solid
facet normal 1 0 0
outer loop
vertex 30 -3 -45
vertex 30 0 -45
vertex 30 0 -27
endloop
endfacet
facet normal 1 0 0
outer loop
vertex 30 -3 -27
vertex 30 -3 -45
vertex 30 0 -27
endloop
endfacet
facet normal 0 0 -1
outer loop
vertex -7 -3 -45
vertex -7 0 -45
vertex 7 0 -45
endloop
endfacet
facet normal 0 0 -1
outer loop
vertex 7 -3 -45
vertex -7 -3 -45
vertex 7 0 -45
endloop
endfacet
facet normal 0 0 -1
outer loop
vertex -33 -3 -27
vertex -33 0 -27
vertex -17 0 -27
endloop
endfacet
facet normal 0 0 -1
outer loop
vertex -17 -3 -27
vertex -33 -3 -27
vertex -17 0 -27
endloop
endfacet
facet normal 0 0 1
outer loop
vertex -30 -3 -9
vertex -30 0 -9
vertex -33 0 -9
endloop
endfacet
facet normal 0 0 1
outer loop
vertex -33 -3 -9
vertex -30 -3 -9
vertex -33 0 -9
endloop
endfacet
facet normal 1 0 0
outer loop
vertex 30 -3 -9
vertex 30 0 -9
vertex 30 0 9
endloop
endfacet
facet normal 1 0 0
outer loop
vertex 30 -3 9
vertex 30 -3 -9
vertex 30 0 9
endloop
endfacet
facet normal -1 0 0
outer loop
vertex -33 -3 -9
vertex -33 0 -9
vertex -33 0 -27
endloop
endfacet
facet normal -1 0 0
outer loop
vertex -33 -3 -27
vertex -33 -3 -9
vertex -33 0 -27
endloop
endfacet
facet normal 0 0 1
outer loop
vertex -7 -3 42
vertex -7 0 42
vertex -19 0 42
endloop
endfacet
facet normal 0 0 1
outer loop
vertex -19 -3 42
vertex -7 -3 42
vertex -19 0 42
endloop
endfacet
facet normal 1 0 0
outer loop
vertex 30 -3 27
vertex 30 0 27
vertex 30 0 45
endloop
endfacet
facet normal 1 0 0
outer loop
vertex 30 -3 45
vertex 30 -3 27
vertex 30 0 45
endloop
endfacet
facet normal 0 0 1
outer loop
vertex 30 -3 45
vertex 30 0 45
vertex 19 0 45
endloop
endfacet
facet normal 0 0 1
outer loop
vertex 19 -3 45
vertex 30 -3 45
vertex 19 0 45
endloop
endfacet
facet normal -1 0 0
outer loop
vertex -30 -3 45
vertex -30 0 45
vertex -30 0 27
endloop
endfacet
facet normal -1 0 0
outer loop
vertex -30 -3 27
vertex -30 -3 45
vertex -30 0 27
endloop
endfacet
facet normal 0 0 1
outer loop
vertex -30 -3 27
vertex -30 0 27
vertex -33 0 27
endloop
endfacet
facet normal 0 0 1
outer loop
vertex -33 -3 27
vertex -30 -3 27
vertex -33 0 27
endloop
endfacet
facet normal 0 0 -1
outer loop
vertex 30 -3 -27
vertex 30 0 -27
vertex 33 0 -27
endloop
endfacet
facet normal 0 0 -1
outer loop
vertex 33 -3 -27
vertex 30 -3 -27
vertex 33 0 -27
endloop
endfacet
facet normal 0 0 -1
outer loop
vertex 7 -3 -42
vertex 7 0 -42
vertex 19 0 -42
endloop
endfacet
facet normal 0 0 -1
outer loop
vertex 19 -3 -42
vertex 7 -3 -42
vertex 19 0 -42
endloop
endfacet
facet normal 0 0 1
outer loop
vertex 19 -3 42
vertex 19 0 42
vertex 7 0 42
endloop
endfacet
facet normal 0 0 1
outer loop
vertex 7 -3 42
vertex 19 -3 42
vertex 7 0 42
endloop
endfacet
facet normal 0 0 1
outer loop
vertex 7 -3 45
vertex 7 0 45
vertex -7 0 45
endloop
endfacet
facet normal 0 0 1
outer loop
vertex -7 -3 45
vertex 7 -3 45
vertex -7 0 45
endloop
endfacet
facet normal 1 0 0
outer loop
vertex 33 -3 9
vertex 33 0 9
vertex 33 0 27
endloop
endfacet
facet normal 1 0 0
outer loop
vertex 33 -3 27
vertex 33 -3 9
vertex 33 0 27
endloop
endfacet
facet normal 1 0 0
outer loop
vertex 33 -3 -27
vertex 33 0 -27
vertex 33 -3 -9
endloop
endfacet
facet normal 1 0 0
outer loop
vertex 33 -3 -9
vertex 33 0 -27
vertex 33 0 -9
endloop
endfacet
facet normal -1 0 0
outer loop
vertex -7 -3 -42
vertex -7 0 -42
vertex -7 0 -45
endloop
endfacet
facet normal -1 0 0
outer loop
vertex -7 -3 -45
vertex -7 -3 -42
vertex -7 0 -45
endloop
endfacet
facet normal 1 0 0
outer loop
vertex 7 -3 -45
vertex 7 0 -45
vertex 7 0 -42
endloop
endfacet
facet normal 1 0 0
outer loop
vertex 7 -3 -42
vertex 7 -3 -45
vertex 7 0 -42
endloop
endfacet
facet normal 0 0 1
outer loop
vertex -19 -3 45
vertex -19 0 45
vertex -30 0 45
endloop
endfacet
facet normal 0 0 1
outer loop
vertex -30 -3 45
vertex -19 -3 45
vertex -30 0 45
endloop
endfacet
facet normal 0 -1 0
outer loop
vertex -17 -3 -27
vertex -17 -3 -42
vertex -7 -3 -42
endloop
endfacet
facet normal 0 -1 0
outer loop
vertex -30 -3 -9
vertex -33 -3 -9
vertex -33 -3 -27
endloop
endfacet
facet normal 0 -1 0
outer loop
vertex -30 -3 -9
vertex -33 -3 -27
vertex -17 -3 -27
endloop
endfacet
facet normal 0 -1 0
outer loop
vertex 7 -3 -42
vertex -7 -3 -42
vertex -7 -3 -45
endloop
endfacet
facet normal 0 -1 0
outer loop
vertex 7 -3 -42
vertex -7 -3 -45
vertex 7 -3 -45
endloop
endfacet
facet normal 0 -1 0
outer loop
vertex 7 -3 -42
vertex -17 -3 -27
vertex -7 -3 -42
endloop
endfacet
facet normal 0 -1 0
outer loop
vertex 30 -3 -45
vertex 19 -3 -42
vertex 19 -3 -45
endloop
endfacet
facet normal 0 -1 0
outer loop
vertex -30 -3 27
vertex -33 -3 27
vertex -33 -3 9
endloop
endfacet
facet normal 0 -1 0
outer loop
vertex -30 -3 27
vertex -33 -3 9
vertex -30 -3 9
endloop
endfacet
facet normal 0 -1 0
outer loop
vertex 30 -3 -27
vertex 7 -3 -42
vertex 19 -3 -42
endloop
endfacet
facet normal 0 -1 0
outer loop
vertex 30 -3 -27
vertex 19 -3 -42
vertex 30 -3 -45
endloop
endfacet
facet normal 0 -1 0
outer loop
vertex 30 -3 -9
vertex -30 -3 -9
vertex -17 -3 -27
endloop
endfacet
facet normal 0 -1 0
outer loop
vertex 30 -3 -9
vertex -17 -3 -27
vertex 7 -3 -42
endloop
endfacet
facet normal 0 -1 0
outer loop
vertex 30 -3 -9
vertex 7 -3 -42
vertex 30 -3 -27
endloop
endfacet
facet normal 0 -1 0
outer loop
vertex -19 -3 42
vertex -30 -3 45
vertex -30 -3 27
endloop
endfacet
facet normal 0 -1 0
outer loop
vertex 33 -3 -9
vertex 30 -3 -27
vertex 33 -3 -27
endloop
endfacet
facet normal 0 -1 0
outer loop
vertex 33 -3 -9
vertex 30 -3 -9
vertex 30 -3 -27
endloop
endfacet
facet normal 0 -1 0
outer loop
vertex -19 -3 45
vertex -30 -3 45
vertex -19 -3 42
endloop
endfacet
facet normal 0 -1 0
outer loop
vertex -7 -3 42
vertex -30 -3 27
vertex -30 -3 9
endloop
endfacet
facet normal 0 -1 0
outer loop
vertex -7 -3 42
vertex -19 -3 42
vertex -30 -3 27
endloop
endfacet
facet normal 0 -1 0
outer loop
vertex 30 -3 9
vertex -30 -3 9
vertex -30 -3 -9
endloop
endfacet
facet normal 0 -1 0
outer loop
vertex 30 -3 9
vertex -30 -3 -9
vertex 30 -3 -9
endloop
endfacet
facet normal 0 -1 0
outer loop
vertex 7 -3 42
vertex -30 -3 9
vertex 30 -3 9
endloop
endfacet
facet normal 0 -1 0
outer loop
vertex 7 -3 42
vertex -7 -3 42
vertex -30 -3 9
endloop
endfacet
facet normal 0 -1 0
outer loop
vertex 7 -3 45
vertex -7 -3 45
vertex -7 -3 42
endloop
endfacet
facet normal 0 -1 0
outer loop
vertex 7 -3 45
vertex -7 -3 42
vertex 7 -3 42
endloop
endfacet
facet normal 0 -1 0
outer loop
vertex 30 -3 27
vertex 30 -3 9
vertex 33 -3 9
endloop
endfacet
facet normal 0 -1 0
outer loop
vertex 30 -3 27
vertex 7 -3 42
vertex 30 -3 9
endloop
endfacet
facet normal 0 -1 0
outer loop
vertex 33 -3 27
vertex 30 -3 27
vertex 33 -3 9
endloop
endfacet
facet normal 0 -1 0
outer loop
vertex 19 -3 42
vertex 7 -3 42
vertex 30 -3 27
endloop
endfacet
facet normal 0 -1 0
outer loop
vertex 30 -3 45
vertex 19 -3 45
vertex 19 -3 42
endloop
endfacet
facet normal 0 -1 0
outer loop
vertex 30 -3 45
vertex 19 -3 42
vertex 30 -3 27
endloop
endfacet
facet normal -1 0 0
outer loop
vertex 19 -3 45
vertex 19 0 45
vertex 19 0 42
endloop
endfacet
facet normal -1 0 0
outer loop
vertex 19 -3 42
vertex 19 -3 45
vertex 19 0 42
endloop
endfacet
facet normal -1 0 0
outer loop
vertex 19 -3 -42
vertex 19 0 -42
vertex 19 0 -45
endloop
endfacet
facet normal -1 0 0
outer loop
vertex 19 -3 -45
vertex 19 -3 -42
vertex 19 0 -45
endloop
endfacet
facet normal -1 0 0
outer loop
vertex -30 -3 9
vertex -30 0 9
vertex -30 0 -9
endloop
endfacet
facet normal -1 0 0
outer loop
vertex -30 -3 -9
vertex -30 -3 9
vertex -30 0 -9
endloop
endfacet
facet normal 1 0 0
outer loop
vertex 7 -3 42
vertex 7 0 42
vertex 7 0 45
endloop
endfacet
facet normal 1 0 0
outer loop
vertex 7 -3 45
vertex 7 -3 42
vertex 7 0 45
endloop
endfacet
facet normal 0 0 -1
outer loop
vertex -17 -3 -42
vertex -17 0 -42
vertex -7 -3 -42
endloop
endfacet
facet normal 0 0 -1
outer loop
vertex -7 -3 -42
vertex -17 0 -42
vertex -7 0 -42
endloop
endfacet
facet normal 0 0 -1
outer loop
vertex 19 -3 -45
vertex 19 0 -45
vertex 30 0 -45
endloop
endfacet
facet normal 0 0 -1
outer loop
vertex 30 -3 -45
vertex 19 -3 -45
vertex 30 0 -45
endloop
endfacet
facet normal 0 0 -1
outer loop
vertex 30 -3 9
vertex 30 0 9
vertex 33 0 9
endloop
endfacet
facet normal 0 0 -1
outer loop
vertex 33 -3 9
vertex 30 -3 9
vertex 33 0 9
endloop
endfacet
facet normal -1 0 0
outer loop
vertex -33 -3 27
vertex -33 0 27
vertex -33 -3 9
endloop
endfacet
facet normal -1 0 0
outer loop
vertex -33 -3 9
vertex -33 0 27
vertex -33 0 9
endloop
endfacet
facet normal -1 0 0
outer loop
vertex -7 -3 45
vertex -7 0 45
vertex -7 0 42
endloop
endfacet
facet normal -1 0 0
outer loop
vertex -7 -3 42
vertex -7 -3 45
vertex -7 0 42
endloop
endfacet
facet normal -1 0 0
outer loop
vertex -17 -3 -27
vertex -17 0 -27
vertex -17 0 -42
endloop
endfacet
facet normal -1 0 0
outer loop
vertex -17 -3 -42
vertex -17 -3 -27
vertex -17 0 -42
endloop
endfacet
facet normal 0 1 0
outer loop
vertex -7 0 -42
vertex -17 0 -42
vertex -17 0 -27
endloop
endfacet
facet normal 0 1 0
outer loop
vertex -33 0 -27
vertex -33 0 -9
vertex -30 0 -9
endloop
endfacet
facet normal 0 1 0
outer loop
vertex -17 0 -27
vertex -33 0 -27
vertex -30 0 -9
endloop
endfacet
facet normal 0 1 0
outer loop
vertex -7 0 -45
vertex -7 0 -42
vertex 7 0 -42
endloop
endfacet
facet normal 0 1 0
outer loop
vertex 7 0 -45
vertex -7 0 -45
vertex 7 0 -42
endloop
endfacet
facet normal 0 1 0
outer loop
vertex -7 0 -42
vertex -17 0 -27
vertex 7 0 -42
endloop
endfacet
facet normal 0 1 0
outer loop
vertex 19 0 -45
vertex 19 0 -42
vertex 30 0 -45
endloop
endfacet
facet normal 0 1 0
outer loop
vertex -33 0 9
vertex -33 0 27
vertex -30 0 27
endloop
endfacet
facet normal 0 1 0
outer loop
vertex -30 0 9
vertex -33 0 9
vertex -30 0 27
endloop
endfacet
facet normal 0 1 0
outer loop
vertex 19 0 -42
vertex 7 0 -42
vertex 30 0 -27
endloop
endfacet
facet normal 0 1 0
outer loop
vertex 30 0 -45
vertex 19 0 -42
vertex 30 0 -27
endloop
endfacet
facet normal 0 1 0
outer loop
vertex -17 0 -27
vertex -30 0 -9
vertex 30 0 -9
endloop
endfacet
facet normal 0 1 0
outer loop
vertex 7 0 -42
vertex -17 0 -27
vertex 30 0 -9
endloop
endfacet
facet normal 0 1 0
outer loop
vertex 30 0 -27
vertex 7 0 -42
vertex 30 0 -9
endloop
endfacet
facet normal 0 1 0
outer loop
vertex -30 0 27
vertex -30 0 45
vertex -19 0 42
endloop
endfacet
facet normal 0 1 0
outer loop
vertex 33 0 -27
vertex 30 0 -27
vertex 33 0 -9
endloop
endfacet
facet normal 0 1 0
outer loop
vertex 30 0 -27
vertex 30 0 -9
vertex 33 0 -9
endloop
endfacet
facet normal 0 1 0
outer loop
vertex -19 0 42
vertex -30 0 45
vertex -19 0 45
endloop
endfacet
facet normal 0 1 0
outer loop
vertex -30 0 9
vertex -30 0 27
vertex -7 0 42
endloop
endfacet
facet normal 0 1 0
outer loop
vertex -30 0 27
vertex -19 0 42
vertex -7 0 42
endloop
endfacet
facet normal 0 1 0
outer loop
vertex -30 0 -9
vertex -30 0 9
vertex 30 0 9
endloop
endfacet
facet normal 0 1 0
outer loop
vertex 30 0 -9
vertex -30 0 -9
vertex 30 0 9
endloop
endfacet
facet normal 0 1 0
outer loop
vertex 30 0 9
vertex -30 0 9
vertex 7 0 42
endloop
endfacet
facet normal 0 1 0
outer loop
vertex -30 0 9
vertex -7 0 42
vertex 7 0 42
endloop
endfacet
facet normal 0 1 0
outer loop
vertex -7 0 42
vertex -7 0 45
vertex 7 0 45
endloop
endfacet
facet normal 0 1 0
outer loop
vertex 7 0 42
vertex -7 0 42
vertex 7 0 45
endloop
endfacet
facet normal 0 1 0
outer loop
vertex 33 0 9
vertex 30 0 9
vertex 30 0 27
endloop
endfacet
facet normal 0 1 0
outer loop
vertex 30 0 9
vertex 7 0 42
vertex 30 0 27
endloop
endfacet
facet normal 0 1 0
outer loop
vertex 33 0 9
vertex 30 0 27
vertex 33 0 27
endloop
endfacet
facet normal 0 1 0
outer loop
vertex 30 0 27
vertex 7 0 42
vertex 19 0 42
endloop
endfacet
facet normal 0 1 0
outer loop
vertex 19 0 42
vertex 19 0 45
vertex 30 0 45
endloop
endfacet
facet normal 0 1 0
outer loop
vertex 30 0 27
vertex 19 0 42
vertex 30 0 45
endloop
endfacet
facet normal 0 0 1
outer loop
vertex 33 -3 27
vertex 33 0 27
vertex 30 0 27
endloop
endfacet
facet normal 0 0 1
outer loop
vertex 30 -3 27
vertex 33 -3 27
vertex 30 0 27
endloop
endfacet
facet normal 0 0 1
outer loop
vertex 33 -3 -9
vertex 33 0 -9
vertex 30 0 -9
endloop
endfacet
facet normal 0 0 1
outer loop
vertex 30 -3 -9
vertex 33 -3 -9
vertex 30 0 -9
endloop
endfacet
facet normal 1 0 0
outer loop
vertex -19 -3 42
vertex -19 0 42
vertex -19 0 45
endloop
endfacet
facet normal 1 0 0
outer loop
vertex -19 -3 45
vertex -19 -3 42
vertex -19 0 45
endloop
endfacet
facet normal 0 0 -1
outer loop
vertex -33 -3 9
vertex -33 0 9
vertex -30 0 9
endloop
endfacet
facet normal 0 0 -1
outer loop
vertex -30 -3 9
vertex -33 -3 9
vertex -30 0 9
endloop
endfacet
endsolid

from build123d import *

# Parameters (mm, degrees)
F1_DEPTH = 3


with BuildPart() as f1:
    # F0 (on Front) → F1 (new body)
    with BuildSketch(Plane.XZ):
        Polygon((-19, 45), (-30, 45), (-30, 27), (-33, 27), (-33, 9), (-30, 9), (-30, -9), (-33, -9), (-33, -27), (-30, -27), (-17, -27), (-17, -42), (-7, -42), (-7, -45), (7, -45), (7, -42), (19, -42), (19, -45), (30, -45), (30, -27), (33, -27), (33, -9), (30, -9), (30, 9), (33, 9), (33, 27), (30, 27), (30, 45), (19, 45), (19, 42), (7, 42), (7, 45), (-7, 45), (-7, 42), (-19, 42), align=None)
    extrude(amount=F1_DEPTH)


solid = f1.part
